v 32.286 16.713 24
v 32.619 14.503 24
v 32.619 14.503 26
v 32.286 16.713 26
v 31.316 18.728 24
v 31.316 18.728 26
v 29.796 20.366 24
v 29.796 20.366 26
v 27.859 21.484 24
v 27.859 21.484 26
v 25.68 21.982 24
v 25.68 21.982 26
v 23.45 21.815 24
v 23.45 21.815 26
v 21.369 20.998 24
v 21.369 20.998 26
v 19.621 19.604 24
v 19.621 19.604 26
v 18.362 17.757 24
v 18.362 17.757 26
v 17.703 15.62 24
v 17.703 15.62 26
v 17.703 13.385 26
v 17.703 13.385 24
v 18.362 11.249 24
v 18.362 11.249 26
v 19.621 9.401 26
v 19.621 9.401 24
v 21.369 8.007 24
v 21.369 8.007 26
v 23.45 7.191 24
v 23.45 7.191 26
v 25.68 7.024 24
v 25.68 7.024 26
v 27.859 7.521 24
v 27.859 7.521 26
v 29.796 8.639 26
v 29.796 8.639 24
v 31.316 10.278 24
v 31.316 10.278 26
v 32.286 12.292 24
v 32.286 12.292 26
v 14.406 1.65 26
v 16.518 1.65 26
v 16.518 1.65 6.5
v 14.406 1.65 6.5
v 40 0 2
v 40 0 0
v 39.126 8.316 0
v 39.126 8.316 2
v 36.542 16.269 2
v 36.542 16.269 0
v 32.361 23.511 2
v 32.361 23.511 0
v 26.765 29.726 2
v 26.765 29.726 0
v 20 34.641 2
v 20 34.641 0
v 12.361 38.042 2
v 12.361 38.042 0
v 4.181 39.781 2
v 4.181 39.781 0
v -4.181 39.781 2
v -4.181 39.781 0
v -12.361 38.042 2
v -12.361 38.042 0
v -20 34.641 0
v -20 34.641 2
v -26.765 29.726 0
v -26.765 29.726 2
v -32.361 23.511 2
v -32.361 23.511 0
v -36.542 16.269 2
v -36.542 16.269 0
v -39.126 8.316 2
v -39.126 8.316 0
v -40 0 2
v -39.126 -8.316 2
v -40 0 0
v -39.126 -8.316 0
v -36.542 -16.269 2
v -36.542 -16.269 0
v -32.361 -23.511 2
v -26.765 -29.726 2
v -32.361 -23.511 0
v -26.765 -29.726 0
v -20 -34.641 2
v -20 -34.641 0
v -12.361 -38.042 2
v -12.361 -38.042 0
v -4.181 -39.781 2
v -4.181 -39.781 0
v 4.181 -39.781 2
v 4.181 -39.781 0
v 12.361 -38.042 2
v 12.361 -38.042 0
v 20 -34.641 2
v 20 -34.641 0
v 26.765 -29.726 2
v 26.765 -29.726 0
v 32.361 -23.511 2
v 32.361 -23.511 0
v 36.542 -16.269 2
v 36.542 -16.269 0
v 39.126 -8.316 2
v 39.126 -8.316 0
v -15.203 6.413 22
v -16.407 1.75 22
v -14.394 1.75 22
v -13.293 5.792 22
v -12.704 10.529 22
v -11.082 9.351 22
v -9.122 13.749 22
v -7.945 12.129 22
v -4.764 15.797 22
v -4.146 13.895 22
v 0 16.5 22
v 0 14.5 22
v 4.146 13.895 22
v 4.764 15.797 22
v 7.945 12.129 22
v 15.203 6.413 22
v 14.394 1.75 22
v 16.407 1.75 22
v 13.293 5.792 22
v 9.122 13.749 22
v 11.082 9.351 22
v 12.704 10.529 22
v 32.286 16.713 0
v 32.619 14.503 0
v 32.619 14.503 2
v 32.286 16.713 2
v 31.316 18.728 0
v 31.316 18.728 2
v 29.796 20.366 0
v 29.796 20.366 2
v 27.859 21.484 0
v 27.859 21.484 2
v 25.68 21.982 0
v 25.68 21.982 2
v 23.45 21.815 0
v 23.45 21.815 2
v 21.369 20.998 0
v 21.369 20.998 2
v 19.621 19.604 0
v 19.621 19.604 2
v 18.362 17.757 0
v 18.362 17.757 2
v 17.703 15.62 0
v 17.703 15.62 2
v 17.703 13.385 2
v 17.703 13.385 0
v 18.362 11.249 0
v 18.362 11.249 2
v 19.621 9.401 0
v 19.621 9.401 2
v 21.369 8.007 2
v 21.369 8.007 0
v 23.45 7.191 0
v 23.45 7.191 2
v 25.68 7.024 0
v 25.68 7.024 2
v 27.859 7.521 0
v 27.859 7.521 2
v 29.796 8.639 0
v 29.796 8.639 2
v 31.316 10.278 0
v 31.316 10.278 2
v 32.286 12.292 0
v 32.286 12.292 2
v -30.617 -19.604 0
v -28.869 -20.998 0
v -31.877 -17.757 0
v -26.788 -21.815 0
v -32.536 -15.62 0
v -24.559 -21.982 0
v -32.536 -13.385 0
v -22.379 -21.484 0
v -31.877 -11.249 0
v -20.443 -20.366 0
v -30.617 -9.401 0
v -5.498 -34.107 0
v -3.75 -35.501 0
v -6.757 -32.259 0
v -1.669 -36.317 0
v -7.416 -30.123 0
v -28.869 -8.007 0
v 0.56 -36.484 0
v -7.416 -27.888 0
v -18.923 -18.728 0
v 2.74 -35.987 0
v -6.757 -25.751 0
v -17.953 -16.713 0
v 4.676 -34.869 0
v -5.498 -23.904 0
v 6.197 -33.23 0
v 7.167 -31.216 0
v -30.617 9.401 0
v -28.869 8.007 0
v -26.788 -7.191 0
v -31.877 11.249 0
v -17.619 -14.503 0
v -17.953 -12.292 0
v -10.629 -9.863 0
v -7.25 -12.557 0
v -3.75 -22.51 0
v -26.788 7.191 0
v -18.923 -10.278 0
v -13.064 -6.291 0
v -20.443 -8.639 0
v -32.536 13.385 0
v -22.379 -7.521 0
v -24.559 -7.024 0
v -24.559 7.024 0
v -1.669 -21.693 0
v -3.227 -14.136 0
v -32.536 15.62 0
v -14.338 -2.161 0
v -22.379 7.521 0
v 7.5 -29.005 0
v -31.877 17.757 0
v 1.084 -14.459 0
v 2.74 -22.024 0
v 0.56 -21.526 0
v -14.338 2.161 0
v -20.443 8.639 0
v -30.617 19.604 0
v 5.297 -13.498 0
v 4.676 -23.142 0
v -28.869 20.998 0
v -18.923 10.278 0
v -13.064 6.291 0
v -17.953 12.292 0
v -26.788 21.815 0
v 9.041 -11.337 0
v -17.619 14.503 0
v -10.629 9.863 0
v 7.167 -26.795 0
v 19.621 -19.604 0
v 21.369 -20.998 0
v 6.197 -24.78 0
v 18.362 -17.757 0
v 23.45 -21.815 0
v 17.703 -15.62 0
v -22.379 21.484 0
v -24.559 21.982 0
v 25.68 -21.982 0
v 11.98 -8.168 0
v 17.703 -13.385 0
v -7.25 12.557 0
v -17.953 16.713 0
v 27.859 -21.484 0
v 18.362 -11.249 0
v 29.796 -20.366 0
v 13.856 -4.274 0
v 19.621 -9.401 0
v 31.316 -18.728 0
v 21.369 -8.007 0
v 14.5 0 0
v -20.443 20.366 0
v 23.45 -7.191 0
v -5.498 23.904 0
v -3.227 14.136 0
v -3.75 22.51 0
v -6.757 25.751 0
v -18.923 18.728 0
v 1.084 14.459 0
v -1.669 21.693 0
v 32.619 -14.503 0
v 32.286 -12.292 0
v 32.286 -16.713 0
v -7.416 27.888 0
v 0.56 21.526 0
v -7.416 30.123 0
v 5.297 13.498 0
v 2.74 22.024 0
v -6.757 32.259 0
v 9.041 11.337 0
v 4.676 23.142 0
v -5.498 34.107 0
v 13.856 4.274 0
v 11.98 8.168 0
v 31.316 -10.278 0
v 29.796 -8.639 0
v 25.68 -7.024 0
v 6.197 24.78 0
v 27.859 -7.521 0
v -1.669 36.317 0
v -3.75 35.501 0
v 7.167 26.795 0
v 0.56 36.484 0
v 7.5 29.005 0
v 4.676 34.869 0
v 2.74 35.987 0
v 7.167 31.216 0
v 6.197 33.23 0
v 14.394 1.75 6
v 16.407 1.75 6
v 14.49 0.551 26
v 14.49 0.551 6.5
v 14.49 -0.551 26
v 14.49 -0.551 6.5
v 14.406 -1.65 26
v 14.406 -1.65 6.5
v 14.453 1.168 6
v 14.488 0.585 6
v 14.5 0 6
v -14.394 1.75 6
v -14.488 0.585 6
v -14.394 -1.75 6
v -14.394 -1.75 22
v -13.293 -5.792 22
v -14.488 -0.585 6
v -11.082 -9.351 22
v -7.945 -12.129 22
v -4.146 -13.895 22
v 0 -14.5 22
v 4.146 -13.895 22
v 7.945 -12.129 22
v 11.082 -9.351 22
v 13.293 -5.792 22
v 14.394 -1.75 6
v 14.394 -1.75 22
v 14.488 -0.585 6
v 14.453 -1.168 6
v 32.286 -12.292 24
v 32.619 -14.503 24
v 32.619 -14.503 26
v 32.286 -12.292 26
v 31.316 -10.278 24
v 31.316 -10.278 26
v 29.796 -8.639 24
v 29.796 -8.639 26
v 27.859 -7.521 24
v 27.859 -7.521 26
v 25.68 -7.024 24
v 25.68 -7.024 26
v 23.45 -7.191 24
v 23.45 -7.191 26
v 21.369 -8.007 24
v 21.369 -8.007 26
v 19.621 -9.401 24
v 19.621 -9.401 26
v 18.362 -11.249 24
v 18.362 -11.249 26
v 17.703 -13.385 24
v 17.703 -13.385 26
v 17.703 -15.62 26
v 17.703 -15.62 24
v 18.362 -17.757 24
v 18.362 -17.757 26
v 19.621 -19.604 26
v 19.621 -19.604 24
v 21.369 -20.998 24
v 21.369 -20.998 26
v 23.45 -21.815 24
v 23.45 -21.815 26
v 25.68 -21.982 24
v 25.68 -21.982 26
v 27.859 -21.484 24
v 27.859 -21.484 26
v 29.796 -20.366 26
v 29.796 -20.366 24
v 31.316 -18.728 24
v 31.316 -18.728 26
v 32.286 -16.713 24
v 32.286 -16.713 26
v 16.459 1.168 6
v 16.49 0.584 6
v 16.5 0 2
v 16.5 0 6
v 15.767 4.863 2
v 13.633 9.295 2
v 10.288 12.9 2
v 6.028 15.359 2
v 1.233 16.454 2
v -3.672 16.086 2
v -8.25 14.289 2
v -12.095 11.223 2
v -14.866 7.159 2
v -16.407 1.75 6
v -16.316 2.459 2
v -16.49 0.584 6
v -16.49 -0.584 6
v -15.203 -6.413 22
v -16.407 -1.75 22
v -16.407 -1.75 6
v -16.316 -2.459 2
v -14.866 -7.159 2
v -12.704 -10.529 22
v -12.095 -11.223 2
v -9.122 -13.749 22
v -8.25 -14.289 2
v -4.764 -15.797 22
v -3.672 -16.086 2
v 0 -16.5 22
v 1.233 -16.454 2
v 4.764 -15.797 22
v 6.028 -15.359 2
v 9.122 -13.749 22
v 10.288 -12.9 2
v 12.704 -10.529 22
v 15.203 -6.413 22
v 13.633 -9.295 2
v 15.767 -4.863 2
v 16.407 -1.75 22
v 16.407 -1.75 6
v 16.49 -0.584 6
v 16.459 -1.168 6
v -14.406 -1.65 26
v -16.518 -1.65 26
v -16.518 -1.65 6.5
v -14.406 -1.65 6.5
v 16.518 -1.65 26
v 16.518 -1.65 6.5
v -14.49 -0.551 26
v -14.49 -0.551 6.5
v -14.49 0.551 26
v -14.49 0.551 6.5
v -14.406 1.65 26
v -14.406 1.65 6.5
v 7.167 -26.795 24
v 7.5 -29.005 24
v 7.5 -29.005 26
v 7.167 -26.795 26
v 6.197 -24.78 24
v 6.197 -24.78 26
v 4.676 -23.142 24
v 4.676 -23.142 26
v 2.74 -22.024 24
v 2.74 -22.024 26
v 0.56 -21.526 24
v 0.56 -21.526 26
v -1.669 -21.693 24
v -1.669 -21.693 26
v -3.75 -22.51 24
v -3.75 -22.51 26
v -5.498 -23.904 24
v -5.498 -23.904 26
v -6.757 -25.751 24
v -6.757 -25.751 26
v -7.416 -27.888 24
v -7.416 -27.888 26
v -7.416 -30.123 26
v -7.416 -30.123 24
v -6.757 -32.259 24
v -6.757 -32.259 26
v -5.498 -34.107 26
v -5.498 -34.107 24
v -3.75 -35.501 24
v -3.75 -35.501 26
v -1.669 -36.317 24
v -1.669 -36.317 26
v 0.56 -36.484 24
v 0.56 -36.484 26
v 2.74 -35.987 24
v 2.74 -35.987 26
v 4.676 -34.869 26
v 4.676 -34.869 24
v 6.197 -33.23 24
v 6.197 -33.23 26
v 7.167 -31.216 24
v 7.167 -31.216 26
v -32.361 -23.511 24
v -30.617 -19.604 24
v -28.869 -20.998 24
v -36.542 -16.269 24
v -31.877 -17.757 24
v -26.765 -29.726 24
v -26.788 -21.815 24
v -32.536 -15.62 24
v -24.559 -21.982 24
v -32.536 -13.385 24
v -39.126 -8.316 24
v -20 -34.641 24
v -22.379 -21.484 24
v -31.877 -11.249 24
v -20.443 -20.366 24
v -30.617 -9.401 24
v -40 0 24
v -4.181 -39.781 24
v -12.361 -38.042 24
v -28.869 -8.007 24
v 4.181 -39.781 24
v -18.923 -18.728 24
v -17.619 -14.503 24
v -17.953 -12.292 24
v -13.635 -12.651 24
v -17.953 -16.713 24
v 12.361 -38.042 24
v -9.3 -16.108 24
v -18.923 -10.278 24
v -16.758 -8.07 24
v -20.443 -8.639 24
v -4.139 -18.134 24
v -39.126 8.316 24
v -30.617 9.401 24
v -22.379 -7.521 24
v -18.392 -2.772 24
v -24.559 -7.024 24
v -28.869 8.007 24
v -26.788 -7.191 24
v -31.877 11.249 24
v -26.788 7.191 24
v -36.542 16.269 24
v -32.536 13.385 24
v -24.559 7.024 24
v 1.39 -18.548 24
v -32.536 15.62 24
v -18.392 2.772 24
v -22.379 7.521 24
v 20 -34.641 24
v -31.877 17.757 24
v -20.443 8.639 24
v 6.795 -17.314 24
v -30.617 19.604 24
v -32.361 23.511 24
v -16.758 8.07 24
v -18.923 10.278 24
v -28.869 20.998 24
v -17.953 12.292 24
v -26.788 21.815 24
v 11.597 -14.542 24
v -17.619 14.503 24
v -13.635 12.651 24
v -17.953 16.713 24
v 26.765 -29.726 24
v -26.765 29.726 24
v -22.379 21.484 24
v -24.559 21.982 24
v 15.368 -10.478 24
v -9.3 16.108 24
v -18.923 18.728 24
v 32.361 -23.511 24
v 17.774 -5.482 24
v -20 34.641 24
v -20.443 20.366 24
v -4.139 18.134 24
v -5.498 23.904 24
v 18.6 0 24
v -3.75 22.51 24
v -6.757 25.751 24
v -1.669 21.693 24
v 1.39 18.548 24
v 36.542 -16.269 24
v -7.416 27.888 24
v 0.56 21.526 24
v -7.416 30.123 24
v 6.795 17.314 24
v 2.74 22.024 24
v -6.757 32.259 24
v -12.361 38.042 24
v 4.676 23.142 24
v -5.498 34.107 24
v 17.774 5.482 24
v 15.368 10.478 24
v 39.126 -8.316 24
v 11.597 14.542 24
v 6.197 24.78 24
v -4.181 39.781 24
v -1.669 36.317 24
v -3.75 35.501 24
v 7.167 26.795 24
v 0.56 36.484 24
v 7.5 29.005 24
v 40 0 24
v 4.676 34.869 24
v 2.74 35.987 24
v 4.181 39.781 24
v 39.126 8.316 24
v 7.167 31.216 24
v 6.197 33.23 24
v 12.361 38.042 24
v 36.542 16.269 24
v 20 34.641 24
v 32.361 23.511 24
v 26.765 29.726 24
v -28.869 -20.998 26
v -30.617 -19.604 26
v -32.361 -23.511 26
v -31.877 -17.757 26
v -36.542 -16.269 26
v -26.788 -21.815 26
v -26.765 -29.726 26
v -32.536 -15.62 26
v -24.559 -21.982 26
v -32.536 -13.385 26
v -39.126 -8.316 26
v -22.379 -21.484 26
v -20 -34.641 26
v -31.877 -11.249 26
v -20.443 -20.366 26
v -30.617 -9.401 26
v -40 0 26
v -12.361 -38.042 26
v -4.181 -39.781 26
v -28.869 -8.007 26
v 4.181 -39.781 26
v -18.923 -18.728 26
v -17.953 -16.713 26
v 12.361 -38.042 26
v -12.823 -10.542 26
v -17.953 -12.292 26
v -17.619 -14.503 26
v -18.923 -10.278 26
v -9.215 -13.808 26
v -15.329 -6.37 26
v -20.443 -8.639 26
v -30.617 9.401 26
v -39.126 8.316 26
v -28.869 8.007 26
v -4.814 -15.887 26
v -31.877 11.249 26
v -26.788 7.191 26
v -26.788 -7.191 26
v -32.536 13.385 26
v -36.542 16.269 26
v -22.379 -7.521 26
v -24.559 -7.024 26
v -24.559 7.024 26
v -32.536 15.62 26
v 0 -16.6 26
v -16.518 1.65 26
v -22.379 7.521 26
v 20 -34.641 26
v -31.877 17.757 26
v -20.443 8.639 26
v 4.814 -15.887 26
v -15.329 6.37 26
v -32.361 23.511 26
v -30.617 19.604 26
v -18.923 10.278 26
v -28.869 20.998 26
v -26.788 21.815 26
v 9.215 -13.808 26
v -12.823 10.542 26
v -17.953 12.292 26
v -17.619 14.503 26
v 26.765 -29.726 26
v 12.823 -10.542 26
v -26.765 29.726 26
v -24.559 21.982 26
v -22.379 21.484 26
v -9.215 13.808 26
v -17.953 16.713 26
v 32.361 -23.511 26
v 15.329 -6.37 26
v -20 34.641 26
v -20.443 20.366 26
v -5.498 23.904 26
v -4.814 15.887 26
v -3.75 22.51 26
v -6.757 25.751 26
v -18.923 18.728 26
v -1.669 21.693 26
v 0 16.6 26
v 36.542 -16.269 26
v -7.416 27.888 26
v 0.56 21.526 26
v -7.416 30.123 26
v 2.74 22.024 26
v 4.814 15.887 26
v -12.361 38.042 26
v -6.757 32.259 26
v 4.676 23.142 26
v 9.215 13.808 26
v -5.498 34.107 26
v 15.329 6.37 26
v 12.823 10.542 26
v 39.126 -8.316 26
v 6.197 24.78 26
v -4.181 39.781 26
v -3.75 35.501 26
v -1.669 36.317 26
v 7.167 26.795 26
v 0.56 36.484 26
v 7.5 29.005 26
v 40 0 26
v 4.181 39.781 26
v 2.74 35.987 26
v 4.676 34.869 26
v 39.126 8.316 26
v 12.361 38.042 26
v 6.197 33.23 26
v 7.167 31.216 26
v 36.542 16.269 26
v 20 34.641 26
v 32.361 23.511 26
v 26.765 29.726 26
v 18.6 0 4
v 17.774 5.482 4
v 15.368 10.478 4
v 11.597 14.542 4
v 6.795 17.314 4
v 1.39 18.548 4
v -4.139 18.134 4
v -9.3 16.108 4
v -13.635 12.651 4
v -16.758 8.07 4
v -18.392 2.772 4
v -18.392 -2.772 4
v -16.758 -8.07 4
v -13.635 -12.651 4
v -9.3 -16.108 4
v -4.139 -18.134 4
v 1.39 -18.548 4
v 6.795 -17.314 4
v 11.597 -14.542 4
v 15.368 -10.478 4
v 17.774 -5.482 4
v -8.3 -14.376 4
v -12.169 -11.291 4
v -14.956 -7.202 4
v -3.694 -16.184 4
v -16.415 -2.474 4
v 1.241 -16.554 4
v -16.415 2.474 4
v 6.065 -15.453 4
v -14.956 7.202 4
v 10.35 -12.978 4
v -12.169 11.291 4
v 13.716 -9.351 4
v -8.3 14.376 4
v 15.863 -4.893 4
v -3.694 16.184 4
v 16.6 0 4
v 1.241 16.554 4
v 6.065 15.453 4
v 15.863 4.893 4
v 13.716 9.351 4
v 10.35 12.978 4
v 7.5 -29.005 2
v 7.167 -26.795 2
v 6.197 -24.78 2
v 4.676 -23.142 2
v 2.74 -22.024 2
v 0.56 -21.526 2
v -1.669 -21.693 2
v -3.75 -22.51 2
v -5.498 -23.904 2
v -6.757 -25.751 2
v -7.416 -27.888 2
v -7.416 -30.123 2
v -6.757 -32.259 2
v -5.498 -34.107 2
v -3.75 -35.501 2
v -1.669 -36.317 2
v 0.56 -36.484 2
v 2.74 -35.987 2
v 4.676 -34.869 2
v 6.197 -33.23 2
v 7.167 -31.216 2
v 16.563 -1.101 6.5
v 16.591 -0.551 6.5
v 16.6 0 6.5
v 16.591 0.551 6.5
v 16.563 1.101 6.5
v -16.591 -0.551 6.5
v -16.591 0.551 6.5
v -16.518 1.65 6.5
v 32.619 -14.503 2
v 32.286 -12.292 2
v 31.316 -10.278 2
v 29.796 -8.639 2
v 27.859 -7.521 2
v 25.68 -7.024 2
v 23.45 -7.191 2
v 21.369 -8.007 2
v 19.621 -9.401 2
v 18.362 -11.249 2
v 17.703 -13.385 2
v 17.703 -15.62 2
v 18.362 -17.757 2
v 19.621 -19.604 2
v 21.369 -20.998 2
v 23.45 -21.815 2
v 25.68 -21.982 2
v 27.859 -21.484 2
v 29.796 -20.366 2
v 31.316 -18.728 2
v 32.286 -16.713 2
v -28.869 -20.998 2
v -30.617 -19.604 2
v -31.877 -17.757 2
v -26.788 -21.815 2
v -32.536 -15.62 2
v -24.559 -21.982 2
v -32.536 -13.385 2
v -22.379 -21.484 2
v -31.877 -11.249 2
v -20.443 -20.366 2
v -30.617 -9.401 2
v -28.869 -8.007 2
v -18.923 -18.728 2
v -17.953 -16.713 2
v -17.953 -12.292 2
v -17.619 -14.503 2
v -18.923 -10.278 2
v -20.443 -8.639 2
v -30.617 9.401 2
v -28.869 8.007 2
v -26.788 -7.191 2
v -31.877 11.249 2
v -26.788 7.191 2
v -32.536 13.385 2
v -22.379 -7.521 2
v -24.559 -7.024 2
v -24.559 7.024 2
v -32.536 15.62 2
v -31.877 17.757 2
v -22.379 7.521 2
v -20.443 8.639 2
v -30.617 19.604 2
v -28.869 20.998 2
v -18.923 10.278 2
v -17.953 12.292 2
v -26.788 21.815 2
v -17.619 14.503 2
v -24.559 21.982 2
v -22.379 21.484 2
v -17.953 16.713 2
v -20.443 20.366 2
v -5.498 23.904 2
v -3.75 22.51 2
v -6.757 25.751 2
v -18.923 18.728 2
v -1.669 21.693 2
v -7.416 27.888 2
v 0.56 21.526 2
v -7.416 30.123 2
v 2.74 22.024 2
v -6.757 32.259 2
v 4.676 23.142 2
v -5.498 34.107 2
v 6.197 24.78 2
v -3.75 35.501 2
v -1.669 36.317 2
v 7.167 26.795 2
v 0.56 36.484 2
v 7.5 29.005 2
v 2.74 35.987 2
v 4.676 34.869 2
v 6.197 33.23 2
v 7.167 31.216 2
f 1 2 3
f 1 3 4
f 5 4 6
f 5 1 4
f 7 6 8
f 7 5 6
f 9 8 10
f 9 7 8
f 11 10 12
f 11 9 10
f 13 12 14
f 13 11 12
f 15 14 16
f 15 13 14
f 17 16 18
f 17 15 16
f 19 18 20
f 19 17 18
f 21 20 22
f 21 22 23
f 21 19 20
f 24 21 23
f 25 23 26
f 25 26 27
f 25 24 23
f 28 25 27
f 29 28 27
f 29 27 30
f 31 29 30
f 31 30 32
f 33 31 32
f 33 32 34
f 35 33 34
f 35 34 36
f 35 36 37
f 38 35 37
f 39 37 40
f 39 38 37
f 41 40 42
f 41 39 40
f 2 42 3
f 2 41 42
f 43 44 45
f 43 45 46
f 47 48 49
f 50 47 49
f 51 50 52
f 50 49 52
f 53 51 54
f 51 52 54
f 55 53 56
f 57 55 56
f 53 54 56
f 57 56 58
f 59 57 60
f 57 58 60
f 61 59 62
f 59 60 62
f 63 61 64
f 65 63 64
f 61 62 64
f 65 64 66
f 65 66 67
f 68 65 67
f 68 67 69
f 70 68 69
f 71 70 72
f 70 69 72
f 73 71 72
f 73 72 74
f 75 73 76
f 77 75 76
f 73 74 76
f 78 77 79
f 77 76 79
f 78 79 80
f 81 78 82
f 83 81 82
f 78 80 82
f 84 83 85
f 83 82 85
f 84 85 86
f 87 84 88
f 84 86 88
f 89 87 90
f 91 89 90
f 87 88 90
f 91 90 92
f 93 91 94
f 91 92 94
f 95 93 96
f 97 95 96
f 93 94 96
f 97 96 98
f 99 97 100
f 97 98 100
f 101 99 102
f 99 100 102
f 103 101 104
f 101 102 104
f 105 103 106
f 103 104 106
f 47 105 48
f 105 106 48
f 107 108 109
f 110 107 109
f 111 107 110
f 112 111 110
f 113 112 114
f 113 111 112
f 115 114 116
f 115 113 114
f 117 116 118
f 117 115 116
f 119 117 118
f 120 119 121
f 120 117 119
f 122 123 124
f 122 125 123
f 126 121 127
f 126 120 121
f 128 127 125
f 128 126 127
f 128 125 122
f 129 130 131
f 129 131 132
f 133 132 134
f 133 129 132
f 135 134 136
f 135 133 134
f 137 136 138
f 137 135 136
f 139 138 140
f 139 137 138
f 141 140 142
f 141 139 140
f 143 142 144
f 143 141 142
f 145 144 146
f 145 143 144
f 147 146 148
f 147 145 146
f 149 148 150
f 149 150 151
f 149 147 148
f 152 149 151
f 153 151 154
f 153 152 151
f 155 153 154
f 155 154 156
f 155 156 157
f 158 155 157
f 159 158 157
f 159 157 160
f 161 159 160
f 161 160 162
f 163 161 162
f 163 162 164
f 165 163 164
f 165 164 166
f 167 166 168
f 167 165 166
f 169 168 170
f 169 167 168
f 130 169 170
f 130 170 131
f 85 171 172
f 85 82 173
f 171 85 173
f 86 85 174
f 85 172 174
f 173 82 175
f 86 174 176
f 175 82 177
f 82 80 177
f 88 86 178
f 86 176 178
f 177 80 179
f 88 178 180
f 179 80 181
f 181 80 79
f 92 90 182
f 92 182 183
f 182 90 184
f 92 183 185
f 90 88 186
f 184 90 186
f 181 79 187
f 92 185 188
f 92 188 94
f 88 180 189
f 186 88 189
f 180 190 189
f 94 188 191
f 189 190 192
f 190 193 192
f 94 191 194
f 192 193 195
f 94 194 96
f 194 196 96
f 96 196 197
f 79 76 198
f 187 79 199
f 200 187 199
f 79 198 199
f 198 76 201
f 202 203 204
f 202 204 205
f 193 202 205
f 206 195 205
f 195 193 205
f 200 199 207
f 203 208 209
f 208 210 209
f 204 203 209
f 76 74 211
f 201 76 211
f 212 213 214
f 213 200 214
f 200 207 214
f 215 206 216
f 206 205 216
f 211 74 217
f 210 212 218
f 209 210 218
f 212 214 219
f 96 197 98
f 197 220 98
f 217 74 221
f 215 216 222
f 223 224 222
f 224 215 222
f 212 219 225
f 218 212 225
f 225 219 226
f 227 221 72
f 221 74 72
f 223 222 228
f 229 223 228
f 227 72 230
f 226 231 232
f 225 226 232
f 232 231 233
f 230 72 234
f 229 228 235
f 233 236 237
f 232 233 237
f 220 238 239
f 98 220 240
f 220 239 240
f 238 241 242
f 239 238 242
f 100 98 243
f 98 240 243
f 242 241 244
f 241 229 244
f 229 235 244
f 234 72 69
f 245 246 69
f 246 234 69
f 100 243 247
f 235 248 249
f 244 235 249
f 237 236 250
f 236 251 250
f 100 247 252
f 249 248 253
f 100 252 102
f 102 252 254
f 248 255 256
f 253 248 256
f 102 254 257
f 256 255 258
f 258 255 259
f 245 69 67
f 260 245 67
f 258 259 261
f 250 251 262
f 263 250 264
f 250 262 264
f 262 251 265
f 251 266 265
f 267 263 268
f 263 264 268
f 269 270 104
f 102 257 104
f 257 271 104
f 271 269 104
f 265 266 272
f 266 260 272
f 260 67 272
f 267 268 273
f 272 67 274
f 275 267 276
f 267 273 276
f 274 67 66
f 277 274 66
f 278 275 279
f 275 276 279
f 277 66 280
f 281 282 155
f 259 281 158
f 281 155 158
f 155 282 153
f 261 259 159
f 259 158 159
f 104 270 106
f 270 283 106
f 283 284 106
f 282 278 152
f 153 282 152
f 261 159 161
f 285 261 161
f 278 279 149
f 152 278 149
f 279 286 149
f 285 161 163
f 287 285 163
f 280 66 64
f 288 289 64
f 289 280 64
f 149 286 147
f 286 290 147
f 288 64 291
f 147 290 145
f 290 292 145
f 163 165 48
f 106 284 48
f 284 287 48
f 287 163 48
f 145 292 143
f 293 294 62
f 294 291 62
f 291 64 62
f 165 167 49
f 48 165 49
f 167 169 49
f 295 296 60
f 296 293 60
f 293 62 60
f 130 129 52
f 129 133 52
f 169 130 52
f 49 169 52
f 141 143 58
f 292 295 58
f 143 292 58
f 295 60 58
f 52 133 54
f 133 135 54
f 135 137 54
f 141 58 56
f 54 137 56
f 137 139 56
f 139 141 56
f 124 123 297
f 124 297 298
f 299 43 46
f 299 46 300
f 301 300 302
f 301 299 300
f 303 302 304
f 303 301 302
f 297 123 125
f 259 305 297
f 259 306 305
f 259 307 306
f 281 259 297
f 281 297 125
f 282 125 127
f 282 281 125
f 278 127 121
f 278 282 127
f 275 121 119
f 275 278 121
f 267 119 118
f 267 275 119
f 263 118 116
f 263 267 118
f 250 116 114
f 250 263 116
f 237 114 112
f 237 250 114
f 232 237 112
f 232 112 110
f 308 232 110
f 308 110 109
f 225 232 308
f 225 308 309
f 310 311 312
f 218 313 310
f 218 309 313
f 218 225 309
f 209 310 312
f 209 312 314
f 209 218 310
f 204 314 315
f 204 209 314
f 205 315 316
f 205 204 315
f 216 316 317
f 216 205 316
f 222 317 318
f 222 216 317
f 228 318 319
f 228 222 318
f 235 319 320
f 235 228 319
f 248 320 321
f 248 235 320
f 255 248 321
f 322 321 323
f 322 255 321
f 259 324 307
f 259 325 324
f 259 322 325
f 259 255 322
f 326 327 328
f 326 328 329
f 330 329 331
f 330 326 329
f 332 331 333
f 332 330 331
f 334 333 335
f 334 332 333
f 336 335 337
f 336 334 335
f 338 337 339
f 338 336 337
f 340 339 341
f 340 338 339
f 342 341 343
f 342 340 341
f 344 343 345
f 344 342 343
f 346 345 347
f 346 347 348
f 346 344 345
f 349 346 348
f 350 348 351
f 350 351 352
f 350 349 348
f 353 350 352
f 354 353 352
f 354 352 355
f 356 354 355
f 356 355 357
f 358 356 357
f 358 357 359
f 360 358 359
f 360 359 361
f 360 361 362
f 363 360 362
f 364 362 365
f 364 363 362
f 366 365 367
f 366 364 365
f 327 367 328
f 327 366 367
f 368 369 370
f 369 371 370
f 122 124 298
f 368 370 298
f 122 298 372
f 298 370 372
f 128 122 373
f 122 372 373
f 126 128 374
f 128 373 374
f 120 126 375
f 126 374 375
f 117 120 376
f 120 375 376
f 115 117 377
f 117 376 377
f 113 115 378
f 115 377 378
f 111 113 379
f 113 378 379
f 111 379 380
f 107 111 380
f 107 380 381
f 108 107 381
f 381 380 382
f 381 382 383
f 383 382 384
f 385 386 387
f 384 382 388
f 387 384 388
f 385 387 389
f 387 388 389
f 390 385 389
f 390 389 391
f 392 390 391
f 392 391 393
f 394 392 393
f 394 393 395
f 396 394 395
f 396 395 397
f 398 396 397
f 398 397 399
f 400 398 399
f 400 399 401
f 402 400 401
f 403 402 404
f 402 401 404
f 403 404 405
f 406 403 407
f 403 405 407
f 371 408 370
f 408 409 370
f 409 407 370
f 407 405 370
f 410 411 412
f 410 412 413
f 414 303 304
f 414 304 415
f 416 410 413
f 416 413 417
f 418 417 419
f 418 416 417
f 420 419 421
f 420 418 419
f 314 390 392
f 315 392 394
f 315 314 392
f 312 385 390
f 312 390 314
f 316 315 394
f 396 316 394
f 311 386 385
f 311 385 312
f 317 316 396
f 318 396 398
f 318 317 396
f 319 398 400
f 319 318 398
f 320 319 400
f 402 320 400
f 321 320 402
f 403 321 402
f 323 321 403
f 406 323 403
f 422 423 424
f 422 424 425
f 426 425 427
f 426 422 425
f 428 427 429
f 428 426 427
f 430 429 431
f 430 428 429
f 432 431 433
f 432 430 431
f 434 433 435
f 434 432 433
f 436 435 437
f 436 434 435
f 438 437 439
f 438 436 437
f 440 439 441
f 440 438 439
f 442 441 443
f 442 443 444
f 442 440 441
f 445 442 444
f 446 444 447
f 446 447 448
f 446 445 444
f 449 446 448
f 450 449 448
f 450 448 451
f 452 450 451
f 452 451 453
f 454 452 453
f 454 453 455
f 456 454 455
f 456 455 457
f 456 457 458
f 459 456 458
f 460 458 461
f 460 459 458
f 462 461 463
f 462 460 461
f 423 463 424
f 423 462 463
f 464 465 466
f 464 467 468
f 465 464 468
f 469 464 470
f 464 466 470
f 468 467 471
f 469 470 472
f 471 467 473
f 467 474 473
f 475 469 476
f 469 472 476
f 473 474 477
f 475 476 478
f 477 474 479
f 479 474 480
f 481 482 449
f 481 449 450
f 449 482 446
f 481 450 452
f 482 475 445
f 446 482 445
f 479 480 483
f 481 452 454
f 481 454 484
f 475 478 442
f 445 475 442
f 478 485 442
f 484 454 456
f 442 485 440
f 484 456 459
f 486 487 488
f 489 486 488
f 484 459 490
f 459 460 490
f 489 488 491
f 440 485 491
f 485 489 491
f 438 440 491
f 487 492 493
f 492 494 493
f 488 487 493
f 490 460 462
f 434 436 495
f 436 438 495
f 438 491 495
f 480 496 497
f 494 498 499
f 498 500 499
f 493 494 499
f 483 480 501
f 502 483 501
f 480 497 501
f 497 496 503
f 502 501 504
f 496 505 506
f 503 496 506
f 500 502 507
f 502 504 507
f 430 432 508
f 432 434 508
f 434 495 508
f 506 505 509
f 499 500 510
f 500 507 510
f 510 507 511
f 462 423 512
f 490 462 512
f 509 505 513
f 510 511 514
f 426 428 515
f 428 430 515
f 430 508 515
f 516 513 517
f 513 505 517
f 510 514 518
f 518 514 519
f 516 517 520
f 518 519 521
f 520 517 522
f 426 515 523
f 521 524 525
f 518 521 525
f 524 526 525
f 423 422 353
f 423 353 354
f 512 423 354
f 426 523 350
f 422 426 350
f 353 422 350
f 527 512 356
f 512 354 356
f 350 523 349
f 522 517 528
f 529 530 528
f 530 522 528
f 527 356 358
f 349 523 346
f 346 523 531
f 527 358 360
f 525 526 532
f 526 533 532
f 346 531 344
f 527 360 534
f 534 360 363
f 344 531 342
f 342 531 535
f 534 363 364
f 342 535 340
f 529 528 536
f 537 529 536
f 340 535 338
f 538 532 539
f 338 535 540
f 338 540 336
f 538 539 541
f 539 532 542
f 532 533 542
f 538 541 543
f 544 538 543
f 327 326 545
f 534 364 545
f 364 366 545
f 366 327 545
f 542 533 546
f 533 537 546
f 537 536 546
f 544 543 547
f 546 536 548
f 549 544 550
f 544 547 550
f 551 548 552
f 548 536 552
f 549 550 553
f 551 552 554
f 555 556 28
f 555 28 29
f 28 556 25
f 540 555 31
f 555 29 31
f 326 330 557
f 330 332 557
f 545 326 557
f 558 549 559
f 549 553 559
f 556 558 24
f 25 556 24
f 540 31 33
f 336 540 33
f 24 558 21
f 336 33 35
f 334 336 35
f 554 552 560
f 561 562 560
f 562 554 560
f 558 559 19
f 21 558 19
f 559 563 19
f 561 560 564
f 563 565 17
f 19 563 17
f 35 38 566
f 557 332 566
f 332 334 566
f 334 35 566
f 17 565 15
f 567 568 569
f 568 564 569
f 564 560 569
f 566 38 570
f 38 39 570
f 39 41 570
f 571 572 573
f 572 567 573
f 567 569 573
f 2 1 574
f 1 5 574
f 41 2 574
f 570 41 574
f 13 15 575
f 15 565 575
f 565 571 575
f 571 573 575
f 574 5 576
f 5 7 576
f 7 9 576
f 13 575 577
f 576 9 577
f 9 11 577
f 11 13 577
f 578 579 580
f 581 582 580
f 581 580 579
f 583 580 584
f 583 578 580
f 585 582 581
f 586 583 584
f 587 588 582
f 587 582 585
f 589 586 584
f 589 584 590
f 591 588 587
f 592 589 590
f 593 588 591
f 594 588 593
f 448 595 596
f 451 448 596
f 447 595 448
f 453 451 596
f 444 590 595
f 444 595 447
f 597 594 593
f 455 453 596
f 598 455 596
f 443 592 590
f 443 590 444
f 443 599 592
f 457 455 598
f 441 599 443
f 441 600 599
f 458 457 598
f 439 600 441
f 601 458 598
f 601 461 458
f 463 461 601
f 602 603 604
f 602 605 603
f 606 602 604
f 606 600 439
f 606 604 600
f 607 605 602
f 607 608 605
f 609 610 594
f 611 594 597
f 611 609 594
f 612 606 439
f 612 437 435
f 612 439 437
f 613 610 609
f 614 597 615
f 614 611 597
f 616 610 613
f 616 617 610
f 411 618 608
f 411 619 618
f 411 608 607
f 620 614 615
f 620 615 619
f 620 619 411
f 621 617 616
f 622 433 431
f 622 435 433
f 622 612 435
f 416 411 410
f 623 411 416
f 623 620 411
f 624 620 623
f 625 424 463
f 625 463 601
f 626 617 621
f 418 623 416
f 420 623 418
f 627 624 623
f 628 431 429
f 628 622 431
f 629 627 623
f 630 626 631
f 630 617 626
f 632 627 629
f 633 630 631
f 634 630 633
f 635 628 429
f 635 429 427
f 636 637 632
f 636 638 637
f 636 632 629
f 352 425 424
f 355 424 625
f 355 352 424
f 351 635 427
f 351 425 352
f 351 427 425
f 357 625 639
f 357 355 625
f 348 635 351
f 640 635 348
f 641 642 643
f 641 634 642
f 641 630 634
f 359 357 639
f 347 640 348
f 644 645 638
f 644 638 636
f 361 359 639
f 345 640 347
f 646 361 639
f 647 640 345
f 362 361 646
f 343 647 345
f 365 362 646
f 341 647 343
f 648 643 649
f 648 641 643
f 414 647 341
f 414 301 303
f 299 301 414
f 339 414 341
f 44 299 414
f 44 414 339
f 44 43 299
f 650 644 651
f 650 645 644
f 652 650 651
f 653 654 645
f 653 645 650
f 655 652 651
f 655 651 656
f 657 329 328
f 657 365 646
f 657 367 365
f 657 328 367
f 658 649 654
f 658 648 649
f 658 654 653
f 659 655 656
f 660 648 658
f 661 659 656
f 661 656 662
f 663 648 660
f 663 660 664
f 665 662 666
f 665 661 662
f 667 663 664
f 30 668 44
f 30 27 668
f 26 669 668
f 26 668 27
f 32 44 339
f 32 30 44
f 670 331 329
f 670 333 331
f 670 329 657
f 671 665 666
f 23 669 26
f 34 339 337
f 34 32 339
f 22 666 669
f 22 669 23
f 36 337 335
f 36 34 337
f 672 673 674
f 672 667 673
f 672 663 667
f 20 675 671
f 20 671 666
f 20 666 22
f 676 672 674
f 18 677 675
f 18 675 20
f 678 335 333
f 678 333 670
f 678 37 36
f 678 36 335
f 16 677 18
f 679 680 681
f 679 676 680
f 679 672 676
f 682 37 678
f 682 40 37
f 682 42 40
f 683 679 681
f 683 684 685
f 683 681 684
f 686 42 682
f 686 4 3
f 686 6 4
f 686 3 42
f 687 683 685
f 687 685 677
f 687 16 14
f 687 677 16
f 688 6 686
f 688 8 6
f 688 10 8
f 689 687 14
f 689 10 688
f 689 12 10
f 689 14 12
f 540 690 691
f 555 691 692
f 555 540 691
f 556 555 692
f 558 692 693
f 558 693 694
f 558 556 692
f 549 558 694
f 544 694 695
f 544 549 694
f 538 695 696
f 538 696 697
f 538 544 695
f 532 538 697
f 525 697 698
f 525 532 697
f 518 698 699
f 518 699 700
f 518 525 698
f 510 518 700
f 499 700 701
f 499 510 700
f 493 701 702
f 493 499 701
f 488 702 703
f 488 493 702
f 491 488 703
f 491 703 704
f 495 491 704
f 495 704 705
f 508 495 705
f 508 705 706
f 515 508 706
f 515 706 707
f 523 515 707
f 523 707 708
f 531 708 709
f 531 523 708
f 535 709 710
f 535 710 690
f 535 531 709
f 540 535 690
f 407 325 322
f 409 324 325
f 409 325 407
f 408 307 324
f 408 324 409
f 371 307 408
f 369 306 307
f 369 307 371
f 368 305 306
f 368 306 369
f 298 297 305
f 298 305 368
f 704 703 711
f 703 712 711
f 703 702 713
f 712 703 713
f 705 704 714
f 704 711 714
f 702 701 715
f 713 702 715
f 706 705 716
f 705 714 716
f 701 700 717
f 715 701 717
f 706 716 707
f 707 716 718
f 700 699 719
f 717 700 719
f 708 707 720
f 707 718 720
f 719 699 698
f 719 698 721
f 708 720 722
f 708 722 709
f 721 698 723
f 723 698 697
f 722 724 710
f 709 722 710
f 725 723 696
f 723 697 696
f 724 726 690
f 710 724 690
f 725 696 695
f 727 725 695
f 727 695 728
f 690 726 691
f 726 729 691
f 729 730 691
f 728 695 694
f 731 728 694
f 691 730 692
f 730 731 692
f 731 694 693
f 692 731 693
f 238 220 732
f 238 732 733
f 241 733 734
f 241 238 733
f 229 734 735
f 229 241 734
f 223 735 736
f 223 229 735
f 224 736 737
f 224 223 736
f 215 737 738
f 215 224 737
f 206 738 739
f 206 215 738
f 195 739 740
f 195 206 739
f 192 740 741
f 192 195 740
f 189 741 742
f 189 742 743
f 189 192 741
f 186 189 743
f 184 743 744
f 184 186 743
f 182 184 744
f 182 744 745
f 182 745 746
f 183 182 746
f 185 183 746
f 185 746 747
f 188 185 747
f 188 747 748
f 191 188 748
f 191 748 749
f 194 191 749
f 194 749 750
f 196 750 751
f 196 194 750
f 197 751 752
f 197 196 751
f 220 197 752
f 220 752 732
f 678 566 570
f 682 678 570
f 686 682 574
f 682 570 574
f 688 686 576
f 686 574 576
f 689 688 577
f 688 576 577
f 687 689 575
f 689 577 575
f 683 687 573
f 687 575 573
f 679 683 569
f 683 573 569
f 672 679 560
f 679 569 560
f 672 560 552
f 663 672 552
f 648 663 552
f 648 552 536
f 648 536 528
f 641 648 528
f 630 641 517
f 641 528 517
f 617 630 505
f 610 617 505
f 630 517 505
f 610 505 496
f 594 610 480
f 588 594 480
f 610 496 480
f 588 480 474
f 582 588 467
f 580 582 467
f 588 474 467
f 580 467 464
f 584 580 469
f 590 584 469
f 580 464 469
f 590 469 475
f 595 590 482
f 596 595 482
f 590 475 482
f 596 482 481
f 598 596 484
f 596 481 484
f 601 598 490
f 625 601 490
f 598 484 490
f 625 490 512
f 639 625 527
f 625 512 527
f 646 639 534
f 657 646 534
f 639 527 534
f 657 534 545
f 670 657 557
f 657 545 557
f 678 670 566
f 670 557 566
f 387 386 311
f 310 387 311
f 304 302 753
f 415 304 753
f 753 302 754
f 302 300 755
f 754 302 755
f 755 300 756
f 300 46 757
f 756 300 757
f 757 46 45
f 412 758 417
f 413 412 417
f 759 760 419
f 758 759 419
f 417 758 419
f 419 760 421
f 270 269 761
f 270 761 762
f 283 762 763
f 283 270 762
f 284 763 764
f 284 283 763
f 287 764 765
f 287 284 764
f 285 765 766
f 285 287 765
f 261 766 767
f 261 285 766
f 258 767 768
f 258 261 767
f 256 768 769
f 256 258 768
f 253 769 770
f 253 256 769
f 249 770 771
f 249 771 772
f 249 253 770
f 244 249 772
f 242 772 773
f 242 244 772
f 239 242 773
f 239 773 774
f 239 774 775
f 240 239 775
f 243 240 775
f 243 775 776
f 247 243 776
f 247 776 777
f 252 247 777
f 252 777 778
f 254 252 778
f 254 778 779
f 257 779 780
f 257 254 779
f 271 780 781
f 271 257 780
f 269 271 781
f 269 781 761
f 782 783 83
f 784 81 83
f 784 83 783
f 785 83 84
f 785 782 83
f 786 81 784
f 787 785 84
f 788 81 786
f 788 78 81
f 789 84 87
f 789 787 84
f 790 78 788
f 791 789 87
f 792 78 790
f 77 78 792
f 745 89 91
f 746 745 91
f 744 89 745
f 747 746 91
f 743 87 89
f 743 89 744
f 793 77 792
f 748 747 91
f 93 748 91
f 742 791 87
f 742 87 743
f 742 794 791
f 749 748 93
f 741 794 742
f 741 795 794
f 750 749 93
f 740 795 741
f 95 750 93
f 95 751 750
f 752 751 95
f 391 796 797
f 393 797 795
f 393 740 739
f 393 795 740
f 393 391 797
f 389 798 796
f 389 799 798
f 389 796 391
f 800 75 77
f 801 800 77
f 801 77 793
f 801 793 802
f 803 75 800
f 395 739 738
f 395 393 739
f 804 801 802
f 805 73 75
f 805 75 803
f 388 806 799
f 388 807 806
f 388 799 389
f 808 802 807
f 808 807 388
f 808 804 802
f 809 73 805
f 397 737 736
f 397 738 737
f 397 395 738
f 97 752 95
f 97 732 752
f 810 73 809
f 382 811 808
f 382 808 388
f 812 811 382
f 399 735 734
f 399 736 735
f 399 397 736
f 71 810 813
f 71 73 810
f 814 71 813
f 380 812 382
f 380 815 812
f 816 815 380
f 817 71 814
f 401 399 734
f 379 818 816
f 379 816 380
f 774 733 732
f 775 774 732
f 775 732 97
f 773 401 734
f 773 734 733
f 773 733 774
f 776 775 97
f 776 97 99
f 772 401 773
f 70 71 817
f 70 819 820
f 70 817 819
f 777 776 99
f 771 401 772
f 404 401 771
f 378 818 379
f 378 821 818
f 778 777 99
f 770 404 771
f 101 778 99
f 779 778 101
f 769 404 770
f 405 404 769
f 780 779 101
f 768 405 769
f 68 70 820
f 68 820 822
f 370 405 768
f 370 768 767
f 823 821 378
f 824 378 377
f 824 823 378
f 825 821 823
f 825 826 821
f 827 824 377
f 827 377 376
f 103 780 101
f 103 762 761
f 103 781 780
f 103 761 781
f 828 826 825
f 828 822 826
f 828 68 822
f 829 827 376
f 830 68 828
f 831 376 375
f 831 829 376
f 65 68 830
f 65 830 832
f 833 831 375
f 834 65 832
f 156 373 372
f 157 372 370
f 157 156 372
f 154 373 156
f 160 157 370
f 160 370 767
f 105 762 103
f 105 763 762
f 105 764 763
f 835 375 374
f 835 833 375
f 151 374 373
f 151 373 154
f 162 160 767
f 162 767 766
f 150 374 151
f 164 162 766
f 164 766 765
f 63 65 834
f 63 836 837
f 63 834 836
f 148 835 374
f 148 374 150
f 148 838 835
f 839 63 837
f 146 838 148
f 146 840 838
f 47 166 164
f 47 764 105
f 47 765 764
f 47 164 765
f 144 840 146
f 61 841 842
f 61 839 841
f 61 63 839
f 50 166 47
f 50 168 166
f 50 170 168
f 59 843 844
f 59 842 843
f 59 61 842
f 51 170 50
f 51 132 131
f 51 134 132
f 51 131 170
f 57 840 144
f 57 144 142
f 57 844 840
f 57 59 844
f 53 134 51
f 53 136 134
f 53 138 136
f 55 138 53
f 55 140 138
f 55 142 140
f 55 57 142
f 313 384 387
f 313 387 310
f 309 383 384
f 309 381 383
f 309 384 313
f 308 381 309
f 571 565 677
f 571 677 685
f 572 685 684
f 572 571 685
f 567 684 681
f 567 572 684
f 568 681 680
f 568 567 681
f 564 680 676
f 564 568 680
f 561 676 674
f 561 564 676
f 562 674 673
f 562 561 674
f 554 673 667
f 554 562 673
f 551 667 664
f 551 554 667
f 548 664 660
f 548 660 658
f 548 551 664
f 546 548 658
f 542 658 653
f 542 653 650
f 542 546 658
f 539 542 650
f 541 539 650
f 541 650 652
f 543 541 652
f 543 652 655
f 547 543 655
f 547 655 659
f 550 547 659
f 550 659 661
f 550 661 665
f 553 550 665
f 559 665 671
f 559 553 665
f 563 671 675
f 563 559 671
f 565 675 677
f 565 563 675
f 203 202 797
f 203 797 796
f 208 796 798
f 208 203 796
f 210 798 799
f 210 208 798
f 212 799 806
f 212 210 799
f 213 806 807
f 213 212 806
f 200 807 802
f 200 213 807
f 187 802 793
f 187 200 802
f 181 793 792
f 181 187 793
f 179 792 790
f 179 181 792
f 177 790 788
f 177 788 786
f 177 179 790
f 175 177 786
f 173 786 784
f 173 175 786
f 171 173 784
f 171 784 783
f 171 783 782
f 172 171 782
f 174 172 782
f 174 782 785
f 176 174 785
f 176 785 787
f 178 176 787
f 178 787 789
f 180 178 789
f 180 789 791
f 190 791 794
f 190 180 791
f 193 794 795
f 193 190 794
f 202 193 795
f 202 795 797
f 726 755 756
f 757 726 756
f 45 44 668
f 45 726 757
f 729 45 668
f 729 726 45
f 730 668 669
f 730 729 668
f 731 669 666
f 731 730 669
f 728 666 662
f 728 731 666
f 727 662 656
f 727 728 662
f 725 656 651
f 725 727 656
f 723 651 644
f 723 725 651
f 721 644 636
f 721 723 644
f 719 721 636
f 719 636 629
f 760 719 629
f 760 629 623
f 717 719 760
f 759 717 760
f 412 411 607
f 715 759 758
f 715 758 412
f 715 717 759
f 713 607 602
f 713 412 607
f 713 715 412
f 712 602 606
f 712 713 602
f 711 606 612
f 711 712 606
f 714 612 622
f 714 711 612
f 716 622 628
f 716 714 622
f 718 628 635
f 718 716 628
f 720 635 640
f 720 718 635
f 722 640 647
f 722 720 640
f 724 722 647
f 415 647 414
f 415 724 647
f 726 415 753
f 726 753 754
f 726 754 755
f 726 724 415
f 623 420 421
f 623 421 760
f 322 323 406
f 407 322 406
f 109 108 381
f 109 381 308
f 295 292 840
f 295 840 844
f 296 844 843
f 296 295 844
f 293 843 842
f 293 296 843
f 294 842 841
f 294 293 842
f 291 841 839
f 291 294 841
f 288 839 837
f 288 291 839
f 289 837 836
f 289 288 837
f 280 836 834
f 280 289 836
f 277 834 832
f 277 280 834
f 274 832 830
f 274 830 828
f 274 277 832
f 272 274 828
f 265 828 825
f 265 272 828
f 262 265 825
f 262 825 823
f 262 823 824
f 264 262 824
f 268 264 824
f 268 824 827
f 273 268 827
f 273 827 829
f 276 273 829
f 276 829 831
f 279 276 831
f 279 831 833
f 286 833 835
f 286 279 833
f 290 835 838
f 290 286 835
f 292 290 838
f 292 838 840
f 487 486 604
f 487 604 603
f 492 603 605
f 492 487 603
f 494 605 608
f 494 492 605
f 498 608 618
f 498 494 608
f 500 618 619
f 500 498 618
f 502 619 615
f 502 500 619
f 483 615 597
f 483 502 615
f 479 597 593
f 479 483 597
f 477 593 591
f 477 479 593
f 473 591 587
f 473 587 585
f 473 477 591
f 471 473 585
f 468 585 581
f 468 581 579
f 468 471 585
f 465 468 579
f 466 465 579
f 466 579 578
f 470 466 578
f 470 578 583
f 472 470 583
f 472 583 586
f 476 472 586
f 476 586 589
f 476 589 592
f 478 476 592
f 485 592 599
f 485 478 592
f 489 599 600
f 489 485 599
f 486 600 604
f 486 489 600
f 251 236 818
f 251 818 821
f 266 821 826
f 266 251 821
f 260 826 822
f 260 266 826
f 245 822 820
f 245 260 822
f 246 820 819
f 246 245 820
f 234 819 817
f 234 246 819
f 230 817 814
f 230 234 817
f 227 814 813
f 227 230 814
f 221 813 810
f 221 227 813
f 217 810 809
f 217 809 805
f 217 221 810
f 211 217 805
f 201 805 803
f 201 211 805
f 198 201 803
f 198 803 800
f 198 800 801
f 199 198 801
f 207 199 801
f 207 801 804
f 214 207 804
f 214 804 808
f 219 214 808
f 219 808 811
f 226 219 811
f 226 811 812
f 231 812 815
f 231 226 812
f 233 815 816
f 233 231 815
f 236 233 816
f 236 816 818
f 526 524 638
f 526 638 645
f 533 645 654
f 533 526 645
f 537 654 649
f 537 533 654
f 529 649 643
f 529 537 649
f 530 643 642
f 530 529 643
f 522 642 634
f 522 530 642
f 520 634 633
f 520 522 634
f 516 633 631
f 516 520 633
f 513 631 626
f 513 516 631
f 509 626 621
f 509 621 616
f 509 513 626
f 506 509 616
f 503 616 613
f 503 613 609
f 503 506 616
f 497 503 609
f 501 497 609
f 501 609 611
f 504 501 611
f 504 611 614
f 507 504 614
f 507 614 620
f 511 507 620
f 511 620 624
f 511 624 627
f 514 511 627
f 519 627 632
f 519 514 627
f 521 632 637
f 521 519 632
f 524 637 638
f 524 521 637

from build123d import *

# Parameters (mm, degrees)
F0_R      = 40
F0_R_2    = 7.5
F0_R_3    = 14.5
F1_DEPTH  = 2
F2_R      = 16.5
F2_R_2    = 14.5
F3_DEPTH  = 20
F4_W      = 40
F4_H      = 3.5
F5_DEPTH  = 16
F7_R      = 18.6
F7_R_2    = 16.6
F8_DEPTH  = 20
F9_R      = 40
F9_R_2    = 7.5
F9_R_3    = 16.6
F10_DEPTH = 2
F12_DEPTH = 19.5
F13_DEPTH = 16


with BuildPart() as f1:
    # F0 (on Top) → F1 (new body)
    with BuildSketch(Plane.XY):
        Circle(F0_R)
        with Locations((-25.1193833225, -14.5026827231)):
            Circle(F0_R_2, mode=Mode.SUBTRACT)
        with Locations((0, -29.0053654462)):
            Circle(F0_R_2, mode=Mode.SUBTRACT)
        with Locations((25.1193833225, -14.5026827231)):
            Circle(F0_R_2, mode=Mode.SUBTRACT)
        with Locations((-25.1193833225, 14.5026827231)):
            Circle(F0_R_2, mode=Mode.SUBTRACT)
        Circle(F0_R_3, mode=Mode.SUBTRACT)
        with Locations((25.1193833225, 14.5026827231)):
            Circle(F0_R_2, mode=Mode.SUBTRACT)
        with Locations((0, 29.0053654462)):
            Circle(F0_R_2, mode=Mode.SUBTRACT)
    extrude(amount=F1_DEPTH)

    # F2 (on face) → F3 (join)
    with BuildSketch(Plane.XY.offset(2)):
        Circle(F2_R)
        Circle(F2_R_2, mode=Mode.SUBTRACT)
    extrude(amount=F3_DEPTH)

    # F4 (on face) → F5 (cut)
    with BuildSketch(Plane.XY.offset(22)):
        Rectangle(F4_W, F4_H)
    extrude(amount=-F5_DEPTH, mode=Mode.SUBTRACT)


with BuildPart() as f8:
    # F7 (on offset) → F8 (new body)
    with BuildSketch(Plane.XY.offset(24)):
        Circle(F7_R)
        Circle(F7_R_2, mode=Mode.SUBTRACT)
    extrude(amount=-F8_DEPTH)

    # F9 (on offset) → F10 (join)
    with BuildSketch(Plane.XY.offset(24)):
        Circle(F9_R)
        with Locations((-25.1193833225, -14.5026827231)):
            Circle(F9_R_2, mode=Mode.SUBTRACT)
        with Locations((0, -29.0053654462)):
            Circle(F9_R_2, mode=Mode.SUBTRACT)
        with Locations((25.1193833225, -14.5026827231)):
            Circle(F9_R_2, mode=Mode.SUBTRACT)
        with Locations((-25.1193833225, 14.5026827231)):
            Circle(F9_R_2, mode=Mode.SUBTRACT)
        Circle(F9_R_3, mode=Mode.SUBTRACT)
        with Locations((25.1193833225, 14.5026827231)):
            Circle(F9_R_2, mode=Mode.SUBTRACT)
        with Locations((0, 29.0053654462)):
            Circle(F9_R_2, mode=Mode.SUBTRACT)
    extrude(amount=F10_DEPTH)

    # F11 (on face) → F12 (join, through all)
    with BuildSketch(Plane.XY.offset(26)):
        with BuildLine():
            Line((16.5177934362, 1.65), (14.4058147982, 1.65))
            ThreePointArc((14.4058147982, 1.65), (14.5, 0), (14.4058147982, -1.65))
            Line((14.4058147982, -1.65), (16.5177934362, -1.65))
            ThreePointArc((16.5177934362, -1.65), (16.6, 0), (16.5177934362, 1.65))
        make_face()
        with BuildLine():
            ThreePointArc((-14.4058147982, -1.65), (-14.5, 0), (-14.4058147982, 1.65))
            Line((-14.4058147982, 1.65), (-16.5177934362, 1.65))
            ThreePointArc((-16.5177934362, 1.65), (-16.6, 0), (-16.5177934362, -1.65))
            Line((-16.5177934362, -1.65), (-14.4058147982, -1.65))
        make_face()
    extrude(amount=-F12_DEPTH)

    # F11 (on face) → F13 (join)
    with BuildSketch(Plane.XY.offset(26)):
        with BuildLine():
            Line((16.5177934362, 1.65), (14.4058147982, 1.65))
            ThreePointArc((14.4058147982, 1.65), (14.5, 0), (14.4058147982, -1.65))
            Line((14.4058147982, -1.65), (16.5177934362, -1.65))
            ThreePointArc((16.5177934362, -1.65), (16.6, 0), (16.5177934362, 1.65))
        make_face()
        with BuildLine():
            ThreePointArc((-14.4058147982, -1.65), (-14.5, 0), (-14.4058147982, 1.65))
            Line((-14.4058147982, 1.65), (-16.5177934362, 1.65))
            ThreePointArc((-16.5177934362, 1.65), (-16.6, 0), (-16.5177934362, -1.65))
            Line((-16.5177934362, -1.65), (-14.4058147982, -1.65))
        make_face()
    extrude(amount=-F13_DEPTH)


solid = Compound([f1.part, f8.part])
